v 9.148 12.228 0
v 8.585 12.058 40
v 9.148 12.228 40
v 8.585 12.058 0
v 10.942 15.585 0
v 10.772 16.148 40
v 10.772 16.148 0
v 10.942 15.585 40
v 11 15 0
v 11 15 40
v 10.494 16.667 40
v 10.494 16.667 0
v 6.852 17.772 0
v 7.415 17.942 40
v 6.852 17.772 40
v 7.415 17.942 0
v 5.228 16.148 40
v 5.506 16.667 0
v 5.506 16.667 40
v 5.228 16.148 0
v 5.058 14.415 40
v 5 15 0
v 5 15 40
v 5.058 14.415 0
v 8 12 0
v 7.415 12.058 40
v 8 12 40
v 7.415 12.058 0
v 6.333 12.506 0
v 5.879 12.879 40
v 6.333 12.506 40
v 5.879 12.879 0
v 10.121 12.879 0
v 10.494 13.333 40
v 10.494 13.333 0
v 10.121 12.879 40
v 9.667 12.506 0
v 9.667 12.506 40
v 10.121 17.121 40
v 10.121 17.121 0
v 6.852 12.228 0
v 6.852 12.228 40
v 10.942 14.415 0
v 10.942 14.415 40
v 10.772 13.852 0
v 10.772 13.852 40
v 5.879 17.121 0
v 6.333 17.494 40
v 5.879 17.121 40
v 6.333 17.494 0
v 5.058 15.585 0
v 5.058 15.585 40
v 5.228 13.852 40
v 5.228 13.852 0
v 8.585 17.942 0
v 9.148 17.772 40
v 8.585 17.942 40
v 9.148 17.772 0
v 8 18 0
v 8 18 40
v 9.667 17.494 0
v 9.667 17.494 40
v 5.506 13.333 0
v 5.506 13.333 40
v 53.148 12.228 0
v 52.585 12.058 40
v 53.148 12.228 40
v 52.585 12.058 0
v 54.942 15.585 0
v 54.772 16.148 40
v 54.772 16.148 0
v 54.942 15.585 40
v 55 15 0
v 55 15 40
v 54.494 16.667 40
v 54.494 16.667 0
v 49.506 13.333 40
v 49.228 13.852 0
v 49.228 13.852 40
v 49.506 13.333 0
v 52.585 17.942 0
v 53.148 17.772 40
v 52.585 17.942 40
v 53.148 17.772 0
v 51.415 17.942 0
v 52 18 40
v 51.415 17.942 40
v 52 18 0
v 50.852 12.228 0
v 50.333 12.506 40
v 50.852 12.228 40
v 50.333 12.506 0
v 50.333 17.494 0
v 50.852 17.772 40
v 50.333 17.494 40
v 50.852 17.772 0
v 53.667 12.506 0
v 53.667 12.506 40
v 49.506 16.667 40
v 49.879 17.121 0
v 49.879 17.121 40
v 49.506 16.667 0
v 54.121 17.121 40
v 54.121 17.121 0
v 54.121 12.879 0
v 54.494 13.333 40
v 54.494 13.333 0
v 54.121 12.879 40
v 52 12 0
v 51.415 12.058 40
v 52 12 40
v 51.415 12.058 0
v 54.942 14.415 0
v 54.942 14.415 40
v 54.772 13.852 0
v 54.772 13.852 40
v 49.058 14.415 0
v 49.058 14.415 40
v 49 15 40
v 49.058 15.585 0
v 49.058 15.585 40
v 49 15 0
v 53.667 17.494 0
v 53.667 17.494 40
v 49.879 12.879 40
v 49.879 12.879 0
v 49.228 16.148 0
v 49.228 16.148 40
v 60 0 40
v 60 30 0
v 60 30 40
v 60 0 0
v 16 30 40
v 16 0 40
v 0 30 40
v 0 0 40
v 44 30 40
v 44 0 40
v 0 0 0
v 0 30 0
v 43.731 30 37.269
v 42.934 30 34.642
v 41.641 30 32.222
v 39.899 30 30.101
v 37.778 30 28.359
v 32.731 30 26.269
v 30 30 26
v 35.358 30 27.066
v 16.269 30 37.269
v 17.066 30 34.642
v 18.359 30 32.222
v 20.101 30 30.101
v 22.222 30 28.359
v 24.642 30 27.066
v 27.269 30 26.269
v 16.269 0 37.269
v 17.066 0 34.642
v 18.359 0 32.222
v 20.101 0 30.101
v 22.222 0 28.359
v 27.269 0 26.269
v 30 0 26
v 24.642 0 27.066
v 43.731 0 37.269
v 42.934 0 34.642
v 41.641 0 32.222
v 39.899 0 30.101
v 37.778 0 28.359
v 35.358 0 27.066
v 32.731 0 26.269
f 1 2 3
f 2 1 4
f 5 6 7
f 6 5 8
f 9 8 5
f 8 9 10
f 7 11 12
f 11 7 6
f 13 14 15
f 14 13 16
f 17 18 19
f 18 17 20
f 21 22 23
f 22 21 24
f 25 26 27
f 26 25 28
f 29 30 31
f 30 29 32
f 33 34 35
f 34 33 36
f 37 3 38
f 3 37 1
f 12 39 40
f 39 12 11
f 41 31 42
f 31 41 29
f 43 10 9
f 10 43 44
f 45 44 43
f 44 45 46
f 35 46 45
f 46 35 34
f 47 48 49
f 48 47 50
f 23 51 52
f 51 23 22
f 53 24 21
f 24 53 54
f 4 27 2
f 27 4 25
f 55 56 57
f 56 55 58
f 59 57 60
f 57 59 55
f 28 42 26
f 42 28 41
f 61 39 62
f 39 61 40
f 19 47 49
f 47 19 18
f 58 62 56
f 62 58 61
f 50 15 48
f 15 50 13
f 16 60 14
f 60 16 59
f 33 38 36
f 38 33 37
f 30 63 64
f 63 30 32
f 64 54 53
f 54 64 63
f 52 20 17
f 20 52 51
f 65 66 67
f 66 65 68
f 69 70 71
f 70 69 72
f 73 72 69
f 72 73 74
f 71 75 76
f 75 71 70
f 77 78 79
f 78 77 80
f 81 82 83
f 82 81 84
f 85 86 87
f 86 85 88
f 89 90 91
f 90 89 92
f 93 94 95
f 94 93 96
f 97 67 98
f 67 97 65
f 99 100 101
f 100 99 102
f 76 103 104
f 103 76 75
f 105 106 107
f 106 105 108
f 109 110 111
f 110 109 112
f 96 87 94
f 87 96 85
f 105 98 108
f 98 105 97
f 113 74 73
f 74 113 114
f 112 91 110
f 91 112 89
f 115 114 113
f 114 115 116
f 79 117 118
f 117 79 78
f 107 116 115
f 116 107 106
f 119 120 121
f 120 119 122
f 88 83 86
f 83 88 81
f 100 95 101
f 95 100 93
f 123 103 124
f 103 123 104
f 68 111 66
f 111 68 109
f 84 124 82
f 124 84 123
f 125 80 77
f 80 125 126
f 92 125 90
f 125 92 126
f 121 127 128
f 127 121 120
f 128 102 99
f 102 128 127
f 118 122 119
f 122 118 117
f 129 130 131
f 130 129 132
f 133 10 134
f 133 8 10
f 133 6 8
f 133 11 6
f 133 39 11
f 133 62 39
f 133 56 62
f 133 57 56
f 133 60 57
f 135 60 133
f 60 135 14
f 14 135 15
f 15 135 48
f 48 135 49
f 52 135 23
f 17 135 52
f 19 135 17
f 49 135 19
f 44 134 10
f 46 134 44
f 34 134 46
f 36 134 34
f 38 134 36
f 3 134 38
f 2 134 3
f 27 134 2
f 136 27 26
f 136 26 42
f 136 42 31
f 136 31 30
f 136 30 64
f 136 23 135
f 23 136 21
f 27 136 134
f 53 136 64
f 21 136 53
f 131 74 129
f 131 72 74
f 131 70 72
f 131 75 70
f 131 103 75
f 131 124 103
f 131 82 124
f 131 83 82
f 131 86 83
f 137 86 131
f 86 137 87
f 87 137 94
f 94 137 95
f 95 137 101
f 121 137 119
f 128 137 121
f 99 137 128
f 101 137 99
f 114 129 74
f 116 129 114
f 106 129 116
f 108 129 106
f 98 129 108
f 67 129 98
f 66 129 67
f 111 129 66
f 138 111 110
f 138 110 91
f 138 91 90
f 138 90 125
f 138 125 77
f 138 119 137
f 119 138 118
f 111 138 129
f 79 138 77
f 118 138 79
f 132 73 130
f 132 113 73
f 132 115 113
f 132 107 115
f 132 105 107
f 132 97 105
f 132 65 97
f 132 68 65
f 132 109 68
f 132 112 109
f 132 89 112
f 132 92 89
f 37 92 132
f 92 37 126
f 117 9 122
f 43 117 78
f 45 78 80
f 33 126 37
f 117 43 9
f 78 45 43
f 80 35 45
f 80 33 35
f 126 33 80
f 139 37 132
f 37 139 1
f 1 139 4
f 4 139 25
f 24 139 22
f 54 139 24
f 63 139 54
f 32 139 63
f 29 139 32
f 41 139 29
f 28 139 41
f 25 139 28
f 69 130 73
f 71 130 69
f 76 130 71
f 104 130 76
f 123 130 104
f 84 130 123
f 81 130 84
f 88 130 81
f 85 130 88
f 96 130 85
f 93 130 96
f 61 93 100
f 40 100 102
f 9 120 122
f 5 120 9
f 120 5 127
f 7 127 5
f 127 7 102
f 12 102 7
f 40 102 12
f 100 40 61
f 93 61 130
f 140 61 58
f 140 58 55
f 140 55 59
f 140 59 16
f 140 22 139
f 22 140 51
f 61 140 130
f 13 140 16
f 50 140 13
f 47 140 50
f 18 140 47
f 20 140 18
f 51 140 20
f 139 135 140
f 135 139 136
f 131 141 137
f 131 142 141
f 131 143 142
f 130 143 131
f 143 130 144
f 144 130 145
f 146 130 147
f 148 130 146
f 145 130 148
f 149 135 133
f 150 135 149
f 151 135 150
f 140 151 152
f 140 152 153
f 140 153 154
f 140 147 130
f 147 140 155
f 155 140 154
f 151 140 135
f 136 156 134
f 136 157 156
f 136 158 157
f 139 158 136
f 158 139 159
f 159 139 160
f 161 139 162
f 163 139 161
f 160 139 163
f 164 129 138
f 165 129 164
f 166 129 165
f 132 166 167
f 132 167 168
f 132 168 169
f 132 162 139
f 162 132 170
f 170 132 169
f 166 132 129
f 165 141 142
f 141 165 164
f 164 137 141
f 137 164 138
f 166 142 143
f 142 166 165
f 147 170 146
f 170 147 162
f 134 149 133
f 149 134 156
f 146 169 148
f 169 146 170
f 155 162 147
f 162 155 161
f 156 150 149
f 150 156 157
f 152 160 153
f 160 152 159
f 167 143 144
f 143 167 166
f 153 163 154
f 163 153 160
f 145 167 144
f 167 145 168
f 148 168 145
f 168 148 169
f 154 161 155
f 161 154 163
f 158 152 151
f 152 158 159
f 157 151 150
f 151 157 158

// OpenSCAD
$fn = 32;

// ----------------------------------------------------------------------
// Saddle clamp: plain shaft clamp
// ----------------------------------------------------------------------

// --- parameters (mm) ---
blk_l = 60;               // block length, X
blk_w = 30;               // block width, Y
blk_h = 40;               // block height
clamp_r = 14;             // shaft groove radius
hole_r = 3;               // bolt hole radius
hole_m = 8;               // bolt hole margin from the ends

saw_depth = clamp_r + 3;  // saw kerf depth

difference() {
  cube([blk_l, blk_w, blk_h]);
  translate([blk_l / 2, -1, blk_h])
    rotate([-90, 0, 0])
      cylinder(h = blk_w + 2, r = clamp_r);
  for (sx = [0, 1])
    translate([sx ? blk_l - hole_m : hole_m, blk_w / 2, -1])
      cylinder(r = hole_r, h = blk_h + 2);
}
